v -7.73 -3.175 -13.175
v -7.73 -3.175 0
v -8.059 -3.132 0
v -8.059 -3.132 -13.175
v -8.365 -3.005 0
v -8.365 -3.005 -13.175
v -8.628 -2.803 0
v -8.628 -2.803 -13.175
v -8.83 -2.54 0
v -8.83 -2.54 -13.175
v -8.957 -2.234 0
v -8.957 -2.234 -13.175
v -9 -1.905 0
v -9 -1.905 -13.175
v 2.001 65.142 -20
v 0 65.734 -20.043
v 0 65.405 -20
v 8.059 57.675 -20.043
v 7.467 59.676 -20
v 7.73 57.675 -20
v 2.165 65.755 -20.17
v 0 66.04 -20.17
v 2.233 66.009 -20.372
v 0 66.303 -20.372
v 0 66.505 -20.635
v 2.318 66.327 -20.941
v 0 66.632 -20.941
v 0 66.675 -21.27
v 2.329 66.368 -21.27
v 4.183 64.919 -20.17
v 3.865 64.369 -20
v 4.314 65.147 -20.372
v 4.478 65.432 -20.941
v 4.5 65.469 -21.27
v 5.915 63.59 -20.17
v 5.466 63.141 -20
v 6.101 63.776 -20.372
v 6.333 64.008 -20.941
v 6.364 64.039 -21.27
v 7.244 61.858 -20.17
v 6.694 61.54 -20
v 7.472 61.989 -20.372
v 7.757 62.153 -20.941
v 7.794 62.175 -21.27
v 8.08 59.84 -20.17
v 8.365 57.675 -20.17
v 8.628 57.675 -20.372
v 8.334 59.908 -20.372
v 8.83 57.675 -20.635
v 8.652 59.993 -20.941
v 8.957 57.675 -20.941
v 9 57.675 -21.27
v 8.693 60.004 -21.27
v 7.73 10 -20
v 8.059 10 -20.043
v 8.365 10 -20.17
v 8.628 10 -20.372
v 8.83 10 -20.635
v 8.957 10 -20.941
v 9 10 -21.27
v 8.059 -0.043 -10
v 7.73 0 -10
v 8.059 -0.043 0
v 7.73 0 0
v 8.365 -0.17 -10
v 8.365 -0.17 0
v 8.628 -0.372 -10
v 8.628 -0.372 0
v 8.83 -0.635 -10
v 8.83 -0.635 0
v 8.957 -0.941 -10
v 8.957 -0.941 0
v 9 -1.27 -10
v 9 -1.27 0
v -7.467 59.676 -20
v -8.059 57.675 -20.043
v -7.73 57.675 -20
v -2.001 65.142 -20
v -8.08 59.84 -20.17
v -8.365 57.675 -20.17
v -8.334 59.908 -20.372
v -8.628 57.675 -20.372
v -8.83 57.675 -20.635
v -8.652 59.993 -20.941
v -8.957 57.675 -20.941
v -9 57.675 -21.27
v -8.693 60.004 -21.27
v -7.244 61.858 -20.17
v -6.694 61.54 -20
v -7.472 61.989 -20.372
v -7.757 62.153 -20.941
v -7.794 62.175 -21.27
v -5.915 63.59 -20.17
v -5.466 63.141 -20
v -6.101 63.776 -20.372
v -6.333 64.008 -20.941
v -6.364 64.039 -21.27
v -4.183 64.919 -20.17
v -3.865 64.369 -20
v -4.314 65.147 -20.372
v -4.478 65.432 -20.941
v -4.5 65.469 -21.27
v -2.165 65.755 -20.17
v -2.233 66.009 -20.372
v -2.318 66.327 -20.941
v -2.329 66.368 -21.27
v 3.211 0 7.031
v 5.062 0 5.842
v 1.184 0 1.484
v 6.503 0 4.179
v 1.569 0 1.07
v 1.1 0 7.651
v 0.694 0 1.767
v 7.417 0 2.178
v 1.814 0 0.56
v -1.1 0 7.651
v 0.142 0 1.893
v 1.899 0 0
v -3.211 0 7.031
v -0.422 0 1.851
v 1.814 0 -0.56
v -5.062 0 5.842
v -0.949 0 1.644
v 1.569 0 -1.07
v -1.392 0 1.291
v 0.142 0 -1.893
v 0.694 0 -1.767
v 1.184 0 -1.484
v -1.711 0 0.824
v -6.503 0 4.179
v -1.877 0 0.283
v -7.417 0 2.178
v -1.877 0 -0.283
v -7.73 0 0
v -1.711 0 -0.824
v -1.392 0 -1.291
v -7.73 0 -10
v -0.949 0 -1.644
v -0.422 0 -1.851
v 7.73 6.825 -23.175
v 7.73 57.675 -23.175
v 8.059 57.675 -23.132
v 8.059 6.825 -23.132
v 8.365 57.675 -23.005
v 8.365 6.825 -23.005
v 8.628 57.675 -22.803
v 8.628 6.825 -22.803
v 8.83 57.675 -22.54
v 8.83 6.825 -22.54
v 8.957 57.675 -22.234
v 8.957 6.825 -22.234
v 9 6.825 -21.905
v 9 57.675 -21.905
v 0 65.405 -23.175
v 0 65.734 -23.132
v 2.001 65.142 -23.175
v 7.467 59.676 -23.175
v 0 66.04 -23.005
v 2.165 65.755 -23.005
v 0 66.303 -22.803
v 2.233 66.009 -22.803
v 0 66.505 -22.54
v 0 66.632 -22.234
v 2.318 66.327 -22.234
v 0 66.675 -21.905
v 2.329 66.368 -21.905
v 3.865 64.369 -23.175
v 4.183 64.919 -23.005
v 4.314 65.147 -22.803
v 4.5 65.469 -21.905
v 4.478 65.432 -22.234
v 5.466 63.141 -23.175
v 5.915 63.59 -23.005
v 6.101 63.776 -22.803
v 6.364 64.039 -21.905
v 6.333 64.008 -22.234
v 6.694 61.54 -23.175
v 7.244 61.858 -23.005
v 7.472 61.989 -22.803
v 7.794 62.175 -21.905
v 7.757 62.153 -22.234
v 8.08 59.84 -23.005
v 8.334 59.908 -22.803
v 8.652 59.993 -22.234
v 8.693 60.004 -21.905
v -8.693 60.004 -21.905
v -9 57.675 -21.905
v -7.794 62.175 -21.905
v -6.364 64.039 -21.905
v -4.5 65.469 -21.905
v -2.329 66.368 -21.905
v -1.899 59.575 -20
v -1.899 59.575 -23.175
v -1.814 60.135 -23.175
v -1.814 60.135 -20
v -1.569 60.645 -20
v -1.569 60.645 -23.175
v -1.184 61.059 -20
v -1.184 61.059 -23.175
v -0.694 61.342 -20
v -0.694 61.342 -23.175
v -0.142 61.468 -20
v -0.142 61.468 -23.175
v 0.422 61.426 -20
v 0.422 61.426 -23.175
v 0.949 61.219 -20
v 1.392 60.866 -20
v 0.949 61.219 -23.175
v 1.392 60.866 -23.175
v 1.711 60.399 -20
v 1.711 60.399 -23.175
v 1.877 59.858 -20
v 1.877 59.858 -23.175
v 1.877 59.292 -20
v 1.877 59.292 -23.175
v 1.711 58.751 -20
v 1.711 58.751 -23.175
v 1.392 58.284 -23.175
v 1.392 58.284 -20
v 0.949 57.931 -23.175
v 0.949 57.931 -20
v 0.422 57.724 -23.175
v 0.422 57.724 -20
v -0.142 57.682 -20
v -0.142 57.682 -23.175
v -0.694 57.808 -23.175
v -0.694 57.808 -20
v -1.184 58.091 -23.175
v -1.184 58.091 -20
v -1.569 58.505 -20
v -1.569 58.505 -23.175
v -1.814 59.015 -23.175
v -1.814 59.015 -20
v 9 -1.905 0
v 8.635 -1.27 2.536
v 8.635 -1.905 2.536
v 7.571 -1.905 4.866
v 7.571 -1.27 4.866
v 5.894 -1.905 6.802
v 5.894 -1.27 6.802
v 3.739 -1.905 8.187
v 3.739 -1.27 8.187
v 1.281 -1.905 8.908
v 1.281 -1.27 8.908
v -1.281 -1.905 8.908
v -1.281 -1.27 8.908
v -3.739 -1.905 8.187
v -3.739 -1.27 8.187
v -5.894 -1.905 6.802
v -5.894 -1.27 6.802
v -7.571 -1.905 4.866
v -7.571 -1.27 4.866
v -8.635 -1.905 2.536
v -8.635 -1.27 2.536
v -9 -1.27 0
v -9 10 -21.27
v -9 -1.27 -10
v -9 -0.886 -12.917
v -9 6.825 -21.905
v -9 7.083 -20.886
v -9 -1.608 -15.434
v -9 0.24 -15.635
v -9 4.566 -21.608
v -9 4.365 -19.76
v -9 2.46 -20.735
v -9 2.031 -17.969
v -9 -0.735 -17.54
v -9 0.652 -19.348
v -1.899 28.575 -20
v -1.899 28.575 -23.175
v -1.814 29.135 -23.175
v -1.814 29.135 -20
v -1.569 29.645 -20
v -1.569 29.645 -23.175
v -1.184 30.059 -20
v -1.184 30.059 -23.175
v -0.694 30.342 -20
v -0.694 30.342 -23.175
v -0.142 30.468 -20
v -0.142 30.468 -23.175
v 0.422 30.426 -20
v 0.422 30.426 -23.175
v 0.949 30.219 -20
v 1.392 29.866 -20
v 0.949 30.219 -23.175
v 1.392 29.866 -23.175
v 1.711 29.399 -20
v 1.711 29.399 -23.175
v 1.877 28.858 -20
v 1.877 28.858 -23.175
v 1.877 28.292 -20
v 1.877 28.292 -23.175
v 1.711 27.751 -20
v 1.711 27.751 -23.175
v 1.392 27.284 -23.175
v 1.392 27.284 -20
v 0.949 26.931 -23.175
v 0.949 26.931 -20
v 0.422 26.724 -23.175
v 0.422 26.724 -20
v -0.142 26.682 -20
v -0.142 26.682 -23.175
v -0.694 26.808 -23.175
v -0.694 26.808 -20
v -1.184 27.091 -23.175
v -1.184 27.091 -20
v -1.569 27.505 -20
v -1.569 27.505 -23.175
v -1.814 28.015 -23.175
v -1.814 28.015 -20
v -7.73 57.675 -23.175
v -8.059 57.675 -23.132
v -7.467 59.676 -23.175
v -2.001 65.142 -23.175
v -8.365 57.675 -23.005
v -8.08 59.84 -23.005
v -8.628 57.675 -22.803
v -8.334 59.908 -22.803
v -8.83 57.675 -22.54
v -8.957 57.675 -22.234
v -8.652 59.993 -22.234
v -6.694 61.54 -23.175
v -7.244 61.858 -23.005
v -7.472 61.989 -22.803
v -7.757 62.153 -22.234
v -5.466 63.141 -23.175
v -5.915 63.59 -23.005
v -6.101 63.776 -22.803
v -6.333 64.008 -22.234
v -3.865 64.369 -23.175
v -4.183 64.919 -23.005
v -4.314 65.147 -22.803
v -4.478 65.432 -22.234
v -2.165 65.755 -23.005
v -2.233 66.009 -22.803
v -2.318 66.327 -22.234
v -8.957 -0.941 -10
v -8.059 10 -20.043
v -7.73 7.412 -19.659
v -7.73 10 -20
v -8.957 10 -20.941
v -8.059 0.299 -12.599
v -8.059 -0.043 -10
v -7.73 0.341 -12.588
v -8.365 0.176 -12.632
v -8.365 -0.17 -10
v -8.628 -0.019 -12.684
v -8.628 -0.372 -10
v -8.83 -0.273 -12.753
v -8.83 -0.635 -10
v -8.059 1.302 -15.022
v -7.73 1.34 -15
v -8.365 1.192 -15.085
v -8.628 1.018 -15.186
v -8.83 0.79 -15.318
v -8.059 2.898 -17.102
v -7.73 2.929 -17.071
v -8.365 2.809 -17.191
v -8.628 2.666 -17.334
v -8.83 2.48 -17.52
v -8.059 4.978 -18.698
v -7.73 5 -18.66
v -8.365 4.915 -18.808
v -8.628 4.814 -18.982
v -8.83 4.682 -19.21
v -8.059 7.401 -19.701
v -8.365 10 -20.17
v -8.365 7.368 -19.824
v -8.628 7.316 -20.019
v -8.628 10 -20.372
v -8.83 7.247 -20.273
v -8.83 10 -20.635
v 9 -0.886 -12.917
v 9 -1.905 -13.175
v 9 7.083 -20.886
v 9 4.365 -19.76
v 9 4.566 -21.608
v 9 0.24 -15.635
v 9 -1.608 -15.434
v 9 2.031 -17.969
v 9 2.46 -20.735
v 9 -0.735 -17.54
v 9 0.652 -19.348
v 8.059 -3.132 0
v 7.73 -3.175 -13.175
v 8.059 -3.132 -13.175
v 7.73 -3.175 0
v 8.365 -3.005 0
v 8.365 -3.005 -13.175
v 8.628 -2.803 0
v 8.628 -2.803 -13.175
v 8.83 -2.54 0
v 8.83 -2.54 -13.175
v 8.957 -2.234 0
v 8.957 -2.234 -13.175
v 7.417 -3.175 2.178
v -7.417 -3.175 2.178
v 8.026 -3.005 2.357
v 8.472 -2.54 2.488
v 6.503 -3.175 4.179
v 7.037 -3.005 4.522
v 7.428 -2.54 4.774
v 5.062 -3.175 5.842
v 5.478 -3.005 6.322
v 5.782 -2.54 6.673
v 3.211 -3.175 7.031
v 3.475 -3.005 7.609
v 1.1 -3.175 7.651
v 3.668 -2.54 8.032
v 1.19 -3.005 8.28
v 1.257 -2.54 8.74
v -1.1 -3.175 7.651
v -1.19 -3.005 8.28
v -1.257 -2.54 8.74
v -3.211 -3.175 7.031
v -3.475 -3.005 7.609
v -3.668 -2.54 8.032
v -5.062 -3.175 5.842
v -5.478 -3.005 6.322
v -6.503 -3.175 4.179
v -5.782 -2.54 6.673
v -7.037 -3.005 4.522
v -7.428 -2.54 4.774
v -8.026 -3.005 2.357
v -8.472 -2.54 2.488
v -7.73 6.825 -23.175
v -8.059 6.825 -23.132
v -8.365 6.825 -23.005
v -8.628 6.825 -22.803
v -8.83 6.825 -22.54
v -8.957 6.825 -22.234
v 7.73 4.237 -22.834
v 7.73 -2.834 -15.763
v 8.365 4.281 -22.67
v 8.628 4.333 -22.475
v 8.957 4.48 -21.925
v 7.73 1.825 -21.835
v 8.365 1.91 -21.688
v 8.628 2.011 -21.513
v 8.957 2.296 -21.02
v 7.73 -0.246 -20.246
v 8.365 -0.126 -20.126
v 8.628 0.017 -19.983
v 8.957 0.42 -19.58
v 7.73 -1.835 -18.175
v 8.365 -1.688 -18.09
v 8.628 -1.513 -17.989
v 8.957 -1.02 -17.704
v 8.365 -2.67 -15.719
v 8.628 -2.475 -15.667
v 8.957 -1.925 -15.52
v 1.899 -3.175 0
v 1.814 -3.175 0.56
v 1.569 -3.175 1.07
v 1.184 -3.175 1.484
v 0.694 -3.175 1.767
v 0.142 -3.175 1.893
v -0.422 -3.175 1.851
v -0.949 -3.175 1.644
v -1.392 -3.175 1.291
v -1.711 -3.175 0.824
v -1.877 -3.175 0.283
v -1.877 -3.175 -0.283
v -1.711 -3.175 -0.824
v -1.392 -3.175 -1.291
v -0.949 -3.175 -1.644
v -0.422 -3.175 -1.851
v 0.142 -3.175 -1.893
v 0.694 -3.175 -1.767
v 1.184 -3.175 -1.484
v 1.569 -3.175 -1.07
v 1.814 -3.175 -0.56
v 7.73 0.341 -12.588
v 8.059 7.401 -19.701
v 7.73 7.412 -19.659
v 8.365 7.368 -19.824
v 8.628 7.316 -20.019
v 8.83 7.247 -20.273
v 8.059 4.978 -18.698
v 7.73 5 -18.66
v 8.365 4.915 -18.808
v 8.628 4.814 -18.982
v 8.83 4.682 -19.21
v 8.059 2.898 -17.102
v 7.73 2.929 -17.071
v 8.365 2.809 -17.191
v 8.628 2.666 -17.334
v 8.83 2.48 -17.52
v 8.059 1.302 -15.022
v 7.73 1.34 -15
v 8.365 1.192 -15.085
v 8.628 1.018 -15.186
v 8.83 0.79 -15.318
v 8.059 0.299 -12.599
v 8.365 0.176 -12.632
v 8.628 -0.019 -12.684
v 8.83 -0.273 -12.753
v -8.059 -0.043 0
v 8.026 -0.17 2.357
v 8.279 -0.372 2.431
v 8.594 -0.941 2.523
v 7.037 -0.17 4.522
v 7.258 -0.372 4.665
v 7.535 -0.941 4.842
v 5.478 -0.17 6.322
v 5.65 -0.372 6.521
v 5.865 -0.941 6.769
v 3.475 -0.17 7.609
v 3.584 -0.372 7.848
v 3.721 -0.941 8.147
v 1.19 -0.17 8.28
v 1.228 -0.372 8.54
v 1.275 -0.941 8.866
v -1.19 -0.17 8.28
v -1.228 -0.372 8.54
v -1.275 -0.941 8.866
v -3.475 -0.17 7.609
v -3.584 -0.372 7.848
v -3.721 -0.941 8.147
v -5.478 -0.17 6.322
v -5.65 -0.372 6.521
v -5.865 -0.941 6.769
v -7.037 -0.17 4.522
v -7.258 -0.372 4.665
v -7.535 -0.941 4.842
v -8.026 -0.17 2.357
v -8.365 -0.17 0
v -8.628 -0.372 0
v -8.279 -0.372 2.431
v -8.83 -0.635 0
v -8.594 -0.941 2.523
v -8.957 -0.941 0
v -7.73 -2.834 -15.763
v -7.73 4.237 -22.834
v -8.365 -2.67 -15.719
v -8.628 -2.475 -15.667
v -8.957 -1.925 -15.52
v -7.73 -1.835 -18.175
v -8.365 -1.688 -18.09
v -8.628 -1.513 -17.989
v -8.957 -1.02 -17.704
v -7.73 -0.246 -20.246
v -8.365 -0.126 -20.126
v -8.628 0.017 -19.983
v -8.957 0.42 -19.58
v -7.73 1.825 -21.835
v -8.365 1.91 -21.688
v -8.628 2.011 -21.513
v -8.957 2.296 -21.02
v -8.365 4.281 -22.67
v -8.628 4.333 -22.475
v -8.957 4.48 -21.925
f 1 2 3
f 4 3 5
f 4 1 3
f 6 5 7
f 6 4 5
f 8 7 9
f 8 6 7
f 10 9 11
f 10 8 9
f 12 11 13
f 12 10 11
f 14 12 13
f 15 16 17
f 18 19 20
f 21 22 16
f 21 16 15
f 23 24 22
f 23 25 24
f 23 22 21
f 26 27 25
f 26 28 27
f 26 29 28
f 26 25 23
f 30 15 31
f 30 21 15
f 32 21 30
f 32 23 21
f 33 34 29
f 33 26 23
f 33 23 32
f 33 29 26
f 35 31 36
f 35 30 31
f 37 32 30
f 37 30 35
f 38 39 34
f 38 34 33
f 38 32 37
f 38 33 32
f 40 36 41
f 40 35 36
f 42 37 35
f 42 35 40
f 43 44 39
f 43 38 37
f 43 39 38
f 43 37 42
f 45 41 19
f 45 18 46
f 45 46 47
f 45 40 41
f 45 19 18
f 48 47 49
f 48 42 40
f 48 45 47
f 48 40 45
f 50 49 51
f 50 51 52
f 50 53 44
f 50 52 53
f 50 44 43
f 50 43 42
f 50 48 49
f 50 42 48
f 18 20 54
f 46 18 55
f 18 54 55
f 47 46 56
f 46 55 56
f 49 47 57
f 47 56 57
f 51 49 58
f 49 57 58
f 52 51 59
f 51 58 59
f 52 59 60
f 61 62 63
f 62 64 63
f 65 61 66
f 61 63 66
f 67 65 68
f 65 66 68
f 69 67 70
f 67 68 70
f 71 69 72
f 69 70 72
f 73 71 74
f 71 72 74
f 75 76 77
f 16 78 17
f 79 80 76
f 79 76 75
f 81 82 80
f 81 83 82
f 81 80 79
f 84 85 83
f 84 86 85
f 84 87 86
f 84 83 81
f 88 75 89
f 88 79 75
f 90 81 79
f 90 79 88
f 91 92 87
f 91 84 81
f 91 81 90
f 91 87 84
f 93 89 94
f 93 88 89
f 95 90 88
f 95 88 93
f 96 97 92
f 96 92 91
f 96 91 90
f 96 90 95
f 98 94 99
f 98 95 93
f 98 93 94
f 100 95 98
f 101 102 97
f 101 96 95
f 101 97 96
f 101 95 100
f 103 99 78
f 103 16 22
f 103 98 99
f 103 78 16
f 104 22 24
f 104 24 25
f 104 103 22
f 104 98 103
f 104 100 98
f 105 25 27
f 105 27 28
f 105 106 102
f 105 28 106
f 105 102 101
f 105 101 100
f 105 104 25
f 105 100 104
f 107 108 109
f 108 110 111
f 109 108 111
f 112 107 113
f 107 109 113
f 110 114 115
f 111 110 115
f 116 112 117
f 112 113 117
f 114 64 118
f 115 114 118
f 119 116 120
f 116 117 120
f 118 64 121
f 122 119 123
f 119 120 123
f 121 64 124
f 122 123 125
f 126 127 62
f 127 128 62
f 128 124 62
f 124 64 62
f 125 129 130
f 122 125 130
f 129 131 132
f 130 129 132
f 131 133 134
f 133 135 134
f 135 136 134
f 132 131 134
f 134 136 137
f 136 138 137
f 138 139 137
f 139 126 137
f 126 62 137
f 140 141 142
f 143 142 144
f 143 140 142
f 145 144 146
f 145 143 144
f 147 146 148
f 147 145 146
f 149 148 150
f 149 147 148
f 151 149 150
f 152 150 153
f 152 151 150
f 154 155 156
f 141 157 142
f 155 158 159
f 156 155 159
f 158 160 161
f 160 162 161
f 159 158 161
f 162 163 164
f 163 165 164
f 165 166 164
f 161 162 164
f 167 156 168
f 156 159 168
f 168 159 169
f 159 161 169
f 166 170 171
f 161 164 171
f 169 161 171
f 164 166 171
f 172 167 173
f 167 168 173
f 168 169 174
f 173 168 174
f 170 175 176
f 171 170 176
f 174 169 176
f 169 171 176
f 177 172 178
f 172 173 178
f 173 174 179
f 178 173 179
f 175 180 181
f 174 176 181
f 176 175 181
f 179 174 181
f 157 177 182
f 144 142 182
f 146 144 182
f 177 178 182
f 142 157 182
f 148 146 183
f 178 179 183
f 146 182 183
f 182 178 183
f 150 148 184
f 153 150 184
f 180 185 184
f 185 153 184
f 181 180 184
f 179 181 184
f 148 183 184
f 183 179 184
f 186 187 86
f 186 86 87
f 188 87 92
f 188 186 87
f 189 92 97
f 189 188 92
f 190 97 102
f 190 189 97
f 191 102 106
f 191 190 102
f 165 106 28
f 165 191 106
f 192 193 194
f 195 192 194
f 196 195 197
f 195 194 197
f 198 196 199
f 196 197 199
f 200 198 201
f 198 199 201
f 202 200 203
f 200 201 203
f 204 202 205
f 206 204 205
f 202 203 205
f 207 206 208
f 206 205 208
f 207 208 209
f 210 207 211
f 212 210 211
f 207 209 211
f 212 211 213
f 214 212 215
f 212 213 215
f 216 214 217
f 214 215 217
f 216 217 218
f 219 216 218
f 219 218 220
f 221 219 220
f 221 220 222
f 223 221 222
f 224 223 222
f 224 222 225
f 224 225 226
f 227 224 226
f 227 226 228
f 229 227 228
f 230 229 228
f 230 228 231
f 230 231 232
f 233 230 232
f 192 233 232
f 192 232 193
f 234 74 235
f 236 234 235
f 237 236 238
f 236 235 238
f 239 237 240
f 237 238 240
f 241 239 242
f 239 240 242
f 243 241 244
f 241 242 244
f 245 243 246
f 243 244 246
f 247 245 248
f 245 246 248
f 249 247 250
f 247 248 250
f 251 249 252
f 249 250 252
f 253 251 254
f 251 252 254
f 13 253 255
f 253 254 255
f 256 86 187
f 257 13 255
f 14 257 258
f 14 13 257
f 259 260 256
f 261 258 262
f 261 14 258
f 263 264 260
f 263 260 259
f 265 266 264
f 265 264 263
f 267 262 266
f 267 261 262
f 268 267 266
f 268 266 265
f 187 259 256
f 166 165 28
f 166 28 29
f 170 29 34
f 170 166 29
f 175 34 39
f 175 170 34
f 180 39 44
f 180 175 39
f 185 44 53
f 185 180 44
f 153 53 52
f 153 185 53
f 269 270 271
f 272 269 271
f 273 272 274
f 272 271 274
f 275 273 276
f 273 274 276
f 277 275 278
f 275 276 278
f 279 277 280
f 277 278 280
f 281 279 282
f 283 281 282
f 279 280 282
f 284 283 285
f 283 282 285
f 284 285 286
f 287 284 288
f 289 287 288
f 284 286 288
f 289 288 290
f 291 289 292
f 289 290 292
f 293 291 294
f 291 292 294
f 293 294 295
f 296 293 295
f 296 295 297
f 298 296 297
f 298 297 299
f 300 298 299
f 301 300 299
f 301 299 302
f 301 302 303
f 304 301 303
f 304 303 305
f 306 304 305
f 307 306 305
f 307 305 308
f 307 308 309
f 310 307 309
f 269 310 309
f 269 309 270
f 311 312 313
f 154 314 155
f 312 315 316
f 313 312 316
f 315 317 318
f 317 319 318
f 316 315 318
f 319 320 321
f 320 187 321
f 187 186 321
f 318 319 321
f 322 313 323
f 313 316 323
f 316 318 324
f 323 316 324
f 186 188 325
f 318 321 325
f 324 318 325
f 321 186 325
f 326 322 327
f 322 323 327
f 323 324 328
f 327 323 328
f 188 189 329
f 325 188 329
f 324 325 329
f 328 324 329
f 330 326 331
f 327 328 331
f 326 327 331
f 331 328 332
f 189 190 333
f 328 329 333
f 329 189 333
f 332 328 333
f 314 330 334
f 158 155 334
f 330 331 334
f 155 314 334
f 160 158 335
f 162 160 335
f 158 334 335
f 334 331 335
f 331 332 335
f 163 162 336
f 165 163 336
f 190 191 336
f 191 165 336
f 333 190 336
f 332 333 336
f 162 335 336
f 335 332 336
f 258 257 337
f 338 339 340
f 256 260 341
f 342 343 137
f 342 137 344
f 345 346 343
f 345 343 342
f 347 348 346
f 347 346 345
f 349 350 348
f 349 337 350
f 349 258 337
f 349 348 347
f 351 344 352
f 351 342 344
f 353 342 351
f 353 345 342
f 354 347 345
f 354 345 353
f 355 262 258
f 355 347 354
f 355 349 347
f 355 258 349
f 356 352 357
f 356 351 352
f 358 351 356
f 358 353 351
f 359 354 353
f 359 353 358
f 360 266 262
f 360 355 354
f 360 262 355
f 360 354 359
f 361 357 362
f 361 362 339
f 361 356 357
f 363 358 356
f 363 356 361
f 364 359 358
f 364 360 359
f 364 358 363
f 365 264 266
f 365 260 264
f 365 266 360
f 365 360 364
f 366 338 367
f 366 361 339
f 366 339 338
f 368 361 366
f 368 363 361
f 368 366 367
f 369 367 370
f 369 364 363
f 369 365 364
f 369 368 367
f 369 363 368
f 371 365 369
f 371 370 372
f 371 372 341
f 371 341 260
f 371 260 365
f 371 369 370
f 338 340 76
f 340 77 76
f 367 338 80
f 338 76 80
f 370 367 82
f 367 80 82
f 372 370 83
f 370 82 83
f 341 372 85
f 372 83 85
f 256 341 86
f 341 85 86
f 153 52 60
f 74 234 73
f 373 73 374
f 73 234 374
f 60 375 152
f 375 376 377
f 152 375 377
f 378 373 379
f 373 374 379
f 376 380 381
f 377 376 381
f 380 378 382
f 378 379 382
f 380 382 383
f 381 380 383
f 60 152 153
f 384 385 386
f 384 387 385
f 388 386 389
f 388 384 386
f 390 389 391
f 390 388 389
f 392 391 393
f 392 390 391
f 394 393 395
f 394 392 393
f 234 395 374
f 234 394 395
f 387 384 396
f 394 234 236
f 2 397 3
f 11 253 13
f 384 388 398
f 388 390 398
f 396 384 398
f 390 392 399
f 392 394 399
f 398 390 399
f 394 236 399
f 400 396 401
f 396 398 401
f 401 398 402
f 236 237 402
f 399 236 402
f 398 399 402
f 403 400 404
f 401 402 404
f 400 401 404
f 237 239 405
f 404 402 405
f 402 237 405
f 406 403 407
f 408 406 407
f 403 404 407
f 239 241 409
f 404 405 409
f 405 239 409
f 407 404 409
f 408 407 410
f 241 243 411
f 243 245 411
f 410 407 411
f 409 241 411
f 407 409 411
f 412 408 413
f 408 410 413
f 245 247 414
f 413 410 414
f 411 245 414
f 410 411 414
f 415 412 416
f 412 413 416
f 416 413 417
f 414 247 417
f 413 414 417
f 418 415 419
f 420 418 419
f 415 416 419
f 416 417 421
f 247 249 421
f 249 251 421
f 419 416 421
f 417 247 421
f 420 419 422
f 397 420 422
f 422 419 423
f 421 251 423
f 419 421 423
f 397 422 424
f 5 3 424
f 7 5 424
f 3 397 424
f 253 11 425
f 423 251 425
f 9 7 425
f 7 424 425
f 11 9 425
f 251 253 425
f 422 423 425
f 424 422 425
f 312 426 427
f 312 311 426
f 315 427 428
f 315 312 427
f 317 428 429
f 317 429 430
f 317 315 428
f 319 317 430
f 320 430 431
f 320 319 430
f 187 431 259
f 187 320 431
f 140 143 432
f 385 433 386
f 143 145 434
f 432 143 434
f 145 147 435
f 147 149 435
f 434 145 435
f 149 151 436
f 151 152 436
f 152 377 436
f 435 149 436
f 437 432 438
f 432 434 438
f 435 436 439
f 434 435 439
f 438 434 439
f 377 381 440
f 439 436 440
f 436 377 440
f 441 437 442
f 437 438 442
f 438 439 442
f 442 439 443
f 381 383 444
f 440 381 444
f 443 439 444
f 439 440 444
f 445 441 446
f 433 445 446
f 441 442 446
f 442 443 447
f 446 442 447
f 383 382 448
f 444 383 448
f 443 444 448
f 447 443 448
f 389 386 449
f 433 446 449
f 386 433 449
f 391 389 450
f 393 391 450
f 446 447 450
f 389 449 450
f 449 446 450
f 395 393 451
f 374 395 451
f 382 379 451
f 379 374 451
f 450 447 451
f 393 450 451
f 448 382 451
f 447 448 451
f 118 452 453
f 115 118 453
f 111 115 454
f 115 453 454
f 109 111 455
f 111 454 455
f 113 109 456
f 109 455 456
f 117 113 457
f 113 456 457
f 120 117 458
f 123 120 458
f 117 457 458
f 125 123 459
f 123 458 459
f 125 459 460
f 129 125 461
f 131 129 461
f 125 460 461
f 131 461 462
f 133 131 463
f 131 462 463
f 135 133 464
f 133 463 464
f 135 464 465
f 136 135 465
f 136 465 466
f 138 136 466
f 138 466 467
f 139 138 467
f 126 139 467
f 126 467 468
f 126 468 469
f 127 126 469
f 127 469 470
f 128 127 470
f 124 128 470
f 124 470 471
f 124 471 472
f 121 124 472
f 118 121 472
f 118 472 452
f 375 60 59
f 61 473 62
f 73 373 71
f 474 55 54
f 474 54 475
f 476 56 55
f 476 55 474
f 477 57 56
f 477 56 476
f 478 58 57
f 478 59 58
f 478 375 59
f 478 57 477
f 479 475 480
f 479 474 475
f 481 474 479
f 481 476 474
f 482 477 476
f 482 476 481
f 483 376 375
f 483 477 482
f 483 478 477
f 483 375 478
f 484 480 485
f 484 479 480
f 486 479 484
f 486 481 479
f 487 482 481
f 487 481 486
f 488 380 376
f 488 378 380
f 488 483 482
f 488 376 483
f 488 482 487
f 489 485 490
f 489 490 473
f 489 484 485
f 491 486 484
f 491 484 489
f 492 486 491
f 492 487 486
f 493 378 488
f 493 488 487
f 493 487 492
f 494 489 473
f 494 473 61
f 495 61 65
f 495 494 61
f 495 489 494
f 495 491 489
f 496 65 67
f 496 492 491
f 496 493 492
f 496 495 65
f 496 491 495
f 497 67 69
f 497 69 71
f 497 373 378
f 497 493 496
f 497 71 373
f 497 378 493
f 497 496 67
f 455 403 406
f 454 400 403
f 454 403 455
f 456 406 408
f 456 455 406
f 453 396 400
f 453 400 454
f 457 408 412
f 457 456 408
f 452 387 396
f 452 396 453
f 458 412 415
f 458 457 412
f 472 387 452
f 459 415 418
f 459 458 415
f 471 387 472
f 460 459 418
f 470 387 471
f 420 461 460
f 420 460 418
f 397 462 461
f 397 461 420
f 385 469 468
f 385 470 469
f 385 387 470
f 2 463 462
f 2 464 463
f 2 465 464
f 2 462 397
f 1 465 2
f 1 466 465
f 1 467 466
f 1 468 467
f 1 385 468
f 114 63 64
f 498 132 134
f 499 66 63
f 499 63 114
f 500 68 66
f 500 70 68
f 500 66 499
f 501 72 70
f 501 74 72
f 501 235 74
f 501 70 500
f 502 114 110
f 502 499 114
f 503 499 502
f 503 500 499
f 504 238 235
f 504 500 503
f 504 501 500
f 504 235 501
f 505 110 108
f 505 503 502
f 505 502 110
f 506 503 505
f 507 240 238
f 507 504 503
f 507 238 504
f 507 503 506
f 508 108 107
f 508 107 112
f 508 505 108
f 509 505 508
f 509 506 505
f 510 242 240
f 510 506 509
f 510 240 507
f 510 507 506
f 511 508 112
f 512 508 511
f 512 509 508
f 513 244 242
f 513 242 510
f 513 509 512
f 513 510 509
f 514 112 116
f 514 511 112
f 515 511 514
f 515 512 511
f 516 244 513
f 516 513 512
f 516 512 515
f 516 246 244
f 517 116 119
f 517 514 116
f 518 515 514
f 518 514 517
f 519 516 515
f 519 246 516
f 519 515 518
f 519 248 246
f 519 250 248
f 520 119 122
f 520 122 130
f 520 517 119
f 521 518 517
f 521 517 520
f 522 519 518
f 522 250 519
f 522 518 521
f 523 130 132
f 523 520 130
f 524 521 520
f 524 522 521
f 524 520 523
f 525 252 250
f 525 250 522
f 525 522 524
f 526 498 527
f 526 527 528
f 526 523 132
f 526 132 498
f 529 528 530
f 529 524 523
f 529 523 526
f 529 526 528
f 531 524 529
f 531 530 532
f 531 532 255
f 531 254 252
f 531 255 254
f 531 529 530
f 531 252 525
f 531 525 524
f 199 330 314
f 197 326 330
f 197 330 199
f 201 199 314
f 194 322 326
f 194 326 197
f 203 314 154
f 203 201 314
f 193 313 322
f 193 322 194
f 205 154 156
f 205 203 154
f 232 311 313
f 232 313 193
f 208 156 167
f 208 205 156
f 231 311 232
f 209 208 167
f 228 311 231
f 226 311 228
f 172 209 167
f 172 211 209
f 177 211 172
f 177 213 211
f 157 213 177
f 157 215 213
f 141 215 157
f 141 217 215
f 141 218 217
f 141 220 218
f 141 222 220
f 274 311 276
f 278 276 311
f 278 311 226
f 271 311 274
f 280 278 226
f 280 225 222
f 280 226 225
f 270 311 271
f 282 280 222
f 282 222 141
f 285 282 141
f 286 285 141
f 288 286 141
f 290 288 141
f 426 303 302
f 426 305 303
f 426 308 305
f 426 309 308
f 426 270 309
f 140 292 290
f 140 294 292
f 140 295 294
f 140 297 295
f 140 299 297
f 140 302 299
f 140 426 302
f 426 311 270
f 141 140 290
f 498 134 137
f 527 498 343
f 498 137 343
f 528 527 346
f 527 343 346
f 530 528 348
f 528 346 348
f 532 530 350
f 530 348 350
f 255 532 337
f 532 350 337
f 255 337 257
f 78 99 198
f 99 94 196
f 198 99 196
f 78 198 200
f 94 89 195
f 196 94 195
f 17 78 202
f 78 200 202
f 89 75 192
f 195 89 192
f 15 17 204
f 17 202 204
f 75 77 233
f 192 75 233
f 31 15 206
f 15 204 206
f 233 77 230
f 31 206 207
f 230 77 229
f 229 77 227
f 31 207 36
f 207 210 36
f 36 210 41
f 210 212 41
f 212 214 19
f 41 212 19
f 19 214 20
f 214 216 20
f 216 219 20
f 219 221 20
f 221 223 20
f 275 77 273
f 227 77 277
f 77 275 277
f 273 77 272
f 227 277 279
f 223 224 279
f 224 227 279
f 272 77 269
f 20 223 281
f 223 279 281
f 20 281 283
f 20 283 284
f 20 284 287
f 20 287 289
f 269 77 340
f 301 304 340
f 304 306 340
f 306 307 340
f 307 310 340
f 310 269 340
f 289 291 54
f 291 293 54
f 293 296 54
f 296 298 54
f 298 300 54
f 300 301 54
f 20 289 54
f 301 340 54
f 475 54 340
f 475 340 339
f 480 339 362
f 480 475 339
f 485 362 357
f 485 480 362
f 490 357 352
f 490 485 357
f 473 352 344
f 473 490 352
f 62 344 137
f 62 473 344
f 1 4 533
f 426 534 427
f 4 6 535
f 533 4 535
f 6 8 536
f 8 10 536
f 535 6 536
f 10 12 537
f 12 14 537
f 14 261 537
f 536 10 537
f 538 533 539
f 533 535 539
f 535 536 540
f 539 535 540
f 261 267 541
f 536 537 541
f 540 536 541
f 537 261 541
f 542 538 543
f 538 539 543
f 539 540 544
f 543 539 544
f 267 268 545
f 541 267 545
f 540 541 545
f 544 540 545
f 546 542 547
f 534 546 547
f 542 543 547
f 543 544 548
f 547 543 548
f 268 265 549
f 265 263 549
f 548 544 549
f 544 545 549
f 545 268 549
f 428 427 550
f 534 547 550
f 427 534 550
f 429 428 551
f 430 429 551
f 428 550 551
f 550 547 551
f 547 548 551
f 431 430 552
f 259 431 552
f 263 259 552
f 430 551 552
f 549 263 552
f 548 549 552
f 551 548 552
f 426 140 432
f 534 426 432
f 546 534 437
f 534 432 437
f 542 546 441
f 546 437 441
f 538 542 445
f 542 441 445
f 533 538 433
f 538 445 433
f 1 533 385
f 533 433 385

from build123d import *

# Parameters (mm, degrees)
SKETCH1_W             = 18
SKETCH1_H             = 3.175
BASE_DEPTH            = 3.175
SKETCH1_3_W           = 18
SKETCH1_3_H           = 3.175
RISER_DEPTH           = 66.675
F_6_CLEARANCE_HOLE2_D = 3.7973
F_6_CLEARANCE_HOLE1_D = 3.7973
FILLET1_R             = 10
FILLET2_R             = 9
FILLET3_R             = 10
FILLET4_R             = 1.27


with BuildPart() as part:
    # Sketch1 → Base (new body)
    with BuildSketch(Plane(origin=(0, 0, 0), x_dir=(1, 0, 0), z_dir=(0, 1, 0))):
        with BuildLine():
            Line((-9, 0), (-9, 20))
            Line((-9, 20), (9, 20))
            Line((9, 20), (9, 0))
            ThreePointArc((9, 0), (0, -9), (-9, 0))
        make_face()
        with Locations((0, 21.5875)):
            Rectangle(SKETCH1_W, SKETCH1_H)
    extrude(amount=-BASE_DEPTH)

    # Sketch1<3> → Riser (add)
    with BuildSketch(Plane(origin=(0, 0, 0), x_dir=(1, 0, 0), z_dir=(0, 1, 0))):
        with Locations((0, 21.5875)):
            Rectangle(SKETCH1_3_W, SKETCH1_3_H)
    extrude(amount=RISER_DEPTH)

    # #6 Clearance Hole2 (through all)
    with Locations(Plane(origin=(0, 0, 0), x_dir=(-1, 0, 0), z_dir=(0, 1, 0))):
        with Locations((0, 0)):
            Hole(F_6_CLEARANCE_HOLE2_D / 2)

    # #6 Clearance Hole1 (through all)
    with Locations(Plane.XY.offset(-20)):
        with Locations((0, 59.575), (0, 28.575)):
            Hole(F_6_CLEARANCE_HOLE1_D / 2)

    # Fillet1
    fillet1_edges = [part.edges().sort_by_distance(p)[0] for p in [
        (0, 0, -20),
    ]]
    fillet(fillet1_edges, radius=FILLET1_R)

    # Fillet2
    fillet2_edges = [part.edges().sort_by_distance(p)[0] for p in [
        (-9, 66.675, -21.5875),
        (9, 66.675, -21.5875),
    ]]
    fillet(fillet2_edges, radius=FILLET2_R - 0.0001)  # a hair under: the kernel refuses the full size

    # Fillet3
    fillet3_edges = [part.edges().sort_by_distance(p)[0] for p in [
        (0, -3.175, -23.175),
    ]]
    fillet(fillet3_edges, radius=FILLET3_R)

    # Fillet4
    fillet4_edges = [part.edges().sort_by_distance(p)[0] for p in [
        (0, -3.175, 9),
        (9, -3.175, -6.5875),
        (-9, -3.175, -6.5875),
        (9, 2.928932188, -17.071067812),
        (-9, 2.928932188, -17.071067812),
        (-9, 33.83755, -20),
        (6.36399032, 64.03899032, -23.175),
        (-6.36399032, 64.03899032, -23.175),
        (9, 33.83755, -20),
        (6.36399032, 64.03899032, -20),
        (-6.36399032, 64.03899032, -20),
        (9, 0, -5),
        (9, 32.25005, -23.175),
        (9, -0.246067812, -20.246067812),
        (-9, 32.25005, -23.175),
        (-9, -0.246067812, -20.246067812),
        (0, 0, 9),
        (-9, 0, -5),
    ]]
    fillet(fillet4_edges, radius=FILLET4_R)


solid = part.part
